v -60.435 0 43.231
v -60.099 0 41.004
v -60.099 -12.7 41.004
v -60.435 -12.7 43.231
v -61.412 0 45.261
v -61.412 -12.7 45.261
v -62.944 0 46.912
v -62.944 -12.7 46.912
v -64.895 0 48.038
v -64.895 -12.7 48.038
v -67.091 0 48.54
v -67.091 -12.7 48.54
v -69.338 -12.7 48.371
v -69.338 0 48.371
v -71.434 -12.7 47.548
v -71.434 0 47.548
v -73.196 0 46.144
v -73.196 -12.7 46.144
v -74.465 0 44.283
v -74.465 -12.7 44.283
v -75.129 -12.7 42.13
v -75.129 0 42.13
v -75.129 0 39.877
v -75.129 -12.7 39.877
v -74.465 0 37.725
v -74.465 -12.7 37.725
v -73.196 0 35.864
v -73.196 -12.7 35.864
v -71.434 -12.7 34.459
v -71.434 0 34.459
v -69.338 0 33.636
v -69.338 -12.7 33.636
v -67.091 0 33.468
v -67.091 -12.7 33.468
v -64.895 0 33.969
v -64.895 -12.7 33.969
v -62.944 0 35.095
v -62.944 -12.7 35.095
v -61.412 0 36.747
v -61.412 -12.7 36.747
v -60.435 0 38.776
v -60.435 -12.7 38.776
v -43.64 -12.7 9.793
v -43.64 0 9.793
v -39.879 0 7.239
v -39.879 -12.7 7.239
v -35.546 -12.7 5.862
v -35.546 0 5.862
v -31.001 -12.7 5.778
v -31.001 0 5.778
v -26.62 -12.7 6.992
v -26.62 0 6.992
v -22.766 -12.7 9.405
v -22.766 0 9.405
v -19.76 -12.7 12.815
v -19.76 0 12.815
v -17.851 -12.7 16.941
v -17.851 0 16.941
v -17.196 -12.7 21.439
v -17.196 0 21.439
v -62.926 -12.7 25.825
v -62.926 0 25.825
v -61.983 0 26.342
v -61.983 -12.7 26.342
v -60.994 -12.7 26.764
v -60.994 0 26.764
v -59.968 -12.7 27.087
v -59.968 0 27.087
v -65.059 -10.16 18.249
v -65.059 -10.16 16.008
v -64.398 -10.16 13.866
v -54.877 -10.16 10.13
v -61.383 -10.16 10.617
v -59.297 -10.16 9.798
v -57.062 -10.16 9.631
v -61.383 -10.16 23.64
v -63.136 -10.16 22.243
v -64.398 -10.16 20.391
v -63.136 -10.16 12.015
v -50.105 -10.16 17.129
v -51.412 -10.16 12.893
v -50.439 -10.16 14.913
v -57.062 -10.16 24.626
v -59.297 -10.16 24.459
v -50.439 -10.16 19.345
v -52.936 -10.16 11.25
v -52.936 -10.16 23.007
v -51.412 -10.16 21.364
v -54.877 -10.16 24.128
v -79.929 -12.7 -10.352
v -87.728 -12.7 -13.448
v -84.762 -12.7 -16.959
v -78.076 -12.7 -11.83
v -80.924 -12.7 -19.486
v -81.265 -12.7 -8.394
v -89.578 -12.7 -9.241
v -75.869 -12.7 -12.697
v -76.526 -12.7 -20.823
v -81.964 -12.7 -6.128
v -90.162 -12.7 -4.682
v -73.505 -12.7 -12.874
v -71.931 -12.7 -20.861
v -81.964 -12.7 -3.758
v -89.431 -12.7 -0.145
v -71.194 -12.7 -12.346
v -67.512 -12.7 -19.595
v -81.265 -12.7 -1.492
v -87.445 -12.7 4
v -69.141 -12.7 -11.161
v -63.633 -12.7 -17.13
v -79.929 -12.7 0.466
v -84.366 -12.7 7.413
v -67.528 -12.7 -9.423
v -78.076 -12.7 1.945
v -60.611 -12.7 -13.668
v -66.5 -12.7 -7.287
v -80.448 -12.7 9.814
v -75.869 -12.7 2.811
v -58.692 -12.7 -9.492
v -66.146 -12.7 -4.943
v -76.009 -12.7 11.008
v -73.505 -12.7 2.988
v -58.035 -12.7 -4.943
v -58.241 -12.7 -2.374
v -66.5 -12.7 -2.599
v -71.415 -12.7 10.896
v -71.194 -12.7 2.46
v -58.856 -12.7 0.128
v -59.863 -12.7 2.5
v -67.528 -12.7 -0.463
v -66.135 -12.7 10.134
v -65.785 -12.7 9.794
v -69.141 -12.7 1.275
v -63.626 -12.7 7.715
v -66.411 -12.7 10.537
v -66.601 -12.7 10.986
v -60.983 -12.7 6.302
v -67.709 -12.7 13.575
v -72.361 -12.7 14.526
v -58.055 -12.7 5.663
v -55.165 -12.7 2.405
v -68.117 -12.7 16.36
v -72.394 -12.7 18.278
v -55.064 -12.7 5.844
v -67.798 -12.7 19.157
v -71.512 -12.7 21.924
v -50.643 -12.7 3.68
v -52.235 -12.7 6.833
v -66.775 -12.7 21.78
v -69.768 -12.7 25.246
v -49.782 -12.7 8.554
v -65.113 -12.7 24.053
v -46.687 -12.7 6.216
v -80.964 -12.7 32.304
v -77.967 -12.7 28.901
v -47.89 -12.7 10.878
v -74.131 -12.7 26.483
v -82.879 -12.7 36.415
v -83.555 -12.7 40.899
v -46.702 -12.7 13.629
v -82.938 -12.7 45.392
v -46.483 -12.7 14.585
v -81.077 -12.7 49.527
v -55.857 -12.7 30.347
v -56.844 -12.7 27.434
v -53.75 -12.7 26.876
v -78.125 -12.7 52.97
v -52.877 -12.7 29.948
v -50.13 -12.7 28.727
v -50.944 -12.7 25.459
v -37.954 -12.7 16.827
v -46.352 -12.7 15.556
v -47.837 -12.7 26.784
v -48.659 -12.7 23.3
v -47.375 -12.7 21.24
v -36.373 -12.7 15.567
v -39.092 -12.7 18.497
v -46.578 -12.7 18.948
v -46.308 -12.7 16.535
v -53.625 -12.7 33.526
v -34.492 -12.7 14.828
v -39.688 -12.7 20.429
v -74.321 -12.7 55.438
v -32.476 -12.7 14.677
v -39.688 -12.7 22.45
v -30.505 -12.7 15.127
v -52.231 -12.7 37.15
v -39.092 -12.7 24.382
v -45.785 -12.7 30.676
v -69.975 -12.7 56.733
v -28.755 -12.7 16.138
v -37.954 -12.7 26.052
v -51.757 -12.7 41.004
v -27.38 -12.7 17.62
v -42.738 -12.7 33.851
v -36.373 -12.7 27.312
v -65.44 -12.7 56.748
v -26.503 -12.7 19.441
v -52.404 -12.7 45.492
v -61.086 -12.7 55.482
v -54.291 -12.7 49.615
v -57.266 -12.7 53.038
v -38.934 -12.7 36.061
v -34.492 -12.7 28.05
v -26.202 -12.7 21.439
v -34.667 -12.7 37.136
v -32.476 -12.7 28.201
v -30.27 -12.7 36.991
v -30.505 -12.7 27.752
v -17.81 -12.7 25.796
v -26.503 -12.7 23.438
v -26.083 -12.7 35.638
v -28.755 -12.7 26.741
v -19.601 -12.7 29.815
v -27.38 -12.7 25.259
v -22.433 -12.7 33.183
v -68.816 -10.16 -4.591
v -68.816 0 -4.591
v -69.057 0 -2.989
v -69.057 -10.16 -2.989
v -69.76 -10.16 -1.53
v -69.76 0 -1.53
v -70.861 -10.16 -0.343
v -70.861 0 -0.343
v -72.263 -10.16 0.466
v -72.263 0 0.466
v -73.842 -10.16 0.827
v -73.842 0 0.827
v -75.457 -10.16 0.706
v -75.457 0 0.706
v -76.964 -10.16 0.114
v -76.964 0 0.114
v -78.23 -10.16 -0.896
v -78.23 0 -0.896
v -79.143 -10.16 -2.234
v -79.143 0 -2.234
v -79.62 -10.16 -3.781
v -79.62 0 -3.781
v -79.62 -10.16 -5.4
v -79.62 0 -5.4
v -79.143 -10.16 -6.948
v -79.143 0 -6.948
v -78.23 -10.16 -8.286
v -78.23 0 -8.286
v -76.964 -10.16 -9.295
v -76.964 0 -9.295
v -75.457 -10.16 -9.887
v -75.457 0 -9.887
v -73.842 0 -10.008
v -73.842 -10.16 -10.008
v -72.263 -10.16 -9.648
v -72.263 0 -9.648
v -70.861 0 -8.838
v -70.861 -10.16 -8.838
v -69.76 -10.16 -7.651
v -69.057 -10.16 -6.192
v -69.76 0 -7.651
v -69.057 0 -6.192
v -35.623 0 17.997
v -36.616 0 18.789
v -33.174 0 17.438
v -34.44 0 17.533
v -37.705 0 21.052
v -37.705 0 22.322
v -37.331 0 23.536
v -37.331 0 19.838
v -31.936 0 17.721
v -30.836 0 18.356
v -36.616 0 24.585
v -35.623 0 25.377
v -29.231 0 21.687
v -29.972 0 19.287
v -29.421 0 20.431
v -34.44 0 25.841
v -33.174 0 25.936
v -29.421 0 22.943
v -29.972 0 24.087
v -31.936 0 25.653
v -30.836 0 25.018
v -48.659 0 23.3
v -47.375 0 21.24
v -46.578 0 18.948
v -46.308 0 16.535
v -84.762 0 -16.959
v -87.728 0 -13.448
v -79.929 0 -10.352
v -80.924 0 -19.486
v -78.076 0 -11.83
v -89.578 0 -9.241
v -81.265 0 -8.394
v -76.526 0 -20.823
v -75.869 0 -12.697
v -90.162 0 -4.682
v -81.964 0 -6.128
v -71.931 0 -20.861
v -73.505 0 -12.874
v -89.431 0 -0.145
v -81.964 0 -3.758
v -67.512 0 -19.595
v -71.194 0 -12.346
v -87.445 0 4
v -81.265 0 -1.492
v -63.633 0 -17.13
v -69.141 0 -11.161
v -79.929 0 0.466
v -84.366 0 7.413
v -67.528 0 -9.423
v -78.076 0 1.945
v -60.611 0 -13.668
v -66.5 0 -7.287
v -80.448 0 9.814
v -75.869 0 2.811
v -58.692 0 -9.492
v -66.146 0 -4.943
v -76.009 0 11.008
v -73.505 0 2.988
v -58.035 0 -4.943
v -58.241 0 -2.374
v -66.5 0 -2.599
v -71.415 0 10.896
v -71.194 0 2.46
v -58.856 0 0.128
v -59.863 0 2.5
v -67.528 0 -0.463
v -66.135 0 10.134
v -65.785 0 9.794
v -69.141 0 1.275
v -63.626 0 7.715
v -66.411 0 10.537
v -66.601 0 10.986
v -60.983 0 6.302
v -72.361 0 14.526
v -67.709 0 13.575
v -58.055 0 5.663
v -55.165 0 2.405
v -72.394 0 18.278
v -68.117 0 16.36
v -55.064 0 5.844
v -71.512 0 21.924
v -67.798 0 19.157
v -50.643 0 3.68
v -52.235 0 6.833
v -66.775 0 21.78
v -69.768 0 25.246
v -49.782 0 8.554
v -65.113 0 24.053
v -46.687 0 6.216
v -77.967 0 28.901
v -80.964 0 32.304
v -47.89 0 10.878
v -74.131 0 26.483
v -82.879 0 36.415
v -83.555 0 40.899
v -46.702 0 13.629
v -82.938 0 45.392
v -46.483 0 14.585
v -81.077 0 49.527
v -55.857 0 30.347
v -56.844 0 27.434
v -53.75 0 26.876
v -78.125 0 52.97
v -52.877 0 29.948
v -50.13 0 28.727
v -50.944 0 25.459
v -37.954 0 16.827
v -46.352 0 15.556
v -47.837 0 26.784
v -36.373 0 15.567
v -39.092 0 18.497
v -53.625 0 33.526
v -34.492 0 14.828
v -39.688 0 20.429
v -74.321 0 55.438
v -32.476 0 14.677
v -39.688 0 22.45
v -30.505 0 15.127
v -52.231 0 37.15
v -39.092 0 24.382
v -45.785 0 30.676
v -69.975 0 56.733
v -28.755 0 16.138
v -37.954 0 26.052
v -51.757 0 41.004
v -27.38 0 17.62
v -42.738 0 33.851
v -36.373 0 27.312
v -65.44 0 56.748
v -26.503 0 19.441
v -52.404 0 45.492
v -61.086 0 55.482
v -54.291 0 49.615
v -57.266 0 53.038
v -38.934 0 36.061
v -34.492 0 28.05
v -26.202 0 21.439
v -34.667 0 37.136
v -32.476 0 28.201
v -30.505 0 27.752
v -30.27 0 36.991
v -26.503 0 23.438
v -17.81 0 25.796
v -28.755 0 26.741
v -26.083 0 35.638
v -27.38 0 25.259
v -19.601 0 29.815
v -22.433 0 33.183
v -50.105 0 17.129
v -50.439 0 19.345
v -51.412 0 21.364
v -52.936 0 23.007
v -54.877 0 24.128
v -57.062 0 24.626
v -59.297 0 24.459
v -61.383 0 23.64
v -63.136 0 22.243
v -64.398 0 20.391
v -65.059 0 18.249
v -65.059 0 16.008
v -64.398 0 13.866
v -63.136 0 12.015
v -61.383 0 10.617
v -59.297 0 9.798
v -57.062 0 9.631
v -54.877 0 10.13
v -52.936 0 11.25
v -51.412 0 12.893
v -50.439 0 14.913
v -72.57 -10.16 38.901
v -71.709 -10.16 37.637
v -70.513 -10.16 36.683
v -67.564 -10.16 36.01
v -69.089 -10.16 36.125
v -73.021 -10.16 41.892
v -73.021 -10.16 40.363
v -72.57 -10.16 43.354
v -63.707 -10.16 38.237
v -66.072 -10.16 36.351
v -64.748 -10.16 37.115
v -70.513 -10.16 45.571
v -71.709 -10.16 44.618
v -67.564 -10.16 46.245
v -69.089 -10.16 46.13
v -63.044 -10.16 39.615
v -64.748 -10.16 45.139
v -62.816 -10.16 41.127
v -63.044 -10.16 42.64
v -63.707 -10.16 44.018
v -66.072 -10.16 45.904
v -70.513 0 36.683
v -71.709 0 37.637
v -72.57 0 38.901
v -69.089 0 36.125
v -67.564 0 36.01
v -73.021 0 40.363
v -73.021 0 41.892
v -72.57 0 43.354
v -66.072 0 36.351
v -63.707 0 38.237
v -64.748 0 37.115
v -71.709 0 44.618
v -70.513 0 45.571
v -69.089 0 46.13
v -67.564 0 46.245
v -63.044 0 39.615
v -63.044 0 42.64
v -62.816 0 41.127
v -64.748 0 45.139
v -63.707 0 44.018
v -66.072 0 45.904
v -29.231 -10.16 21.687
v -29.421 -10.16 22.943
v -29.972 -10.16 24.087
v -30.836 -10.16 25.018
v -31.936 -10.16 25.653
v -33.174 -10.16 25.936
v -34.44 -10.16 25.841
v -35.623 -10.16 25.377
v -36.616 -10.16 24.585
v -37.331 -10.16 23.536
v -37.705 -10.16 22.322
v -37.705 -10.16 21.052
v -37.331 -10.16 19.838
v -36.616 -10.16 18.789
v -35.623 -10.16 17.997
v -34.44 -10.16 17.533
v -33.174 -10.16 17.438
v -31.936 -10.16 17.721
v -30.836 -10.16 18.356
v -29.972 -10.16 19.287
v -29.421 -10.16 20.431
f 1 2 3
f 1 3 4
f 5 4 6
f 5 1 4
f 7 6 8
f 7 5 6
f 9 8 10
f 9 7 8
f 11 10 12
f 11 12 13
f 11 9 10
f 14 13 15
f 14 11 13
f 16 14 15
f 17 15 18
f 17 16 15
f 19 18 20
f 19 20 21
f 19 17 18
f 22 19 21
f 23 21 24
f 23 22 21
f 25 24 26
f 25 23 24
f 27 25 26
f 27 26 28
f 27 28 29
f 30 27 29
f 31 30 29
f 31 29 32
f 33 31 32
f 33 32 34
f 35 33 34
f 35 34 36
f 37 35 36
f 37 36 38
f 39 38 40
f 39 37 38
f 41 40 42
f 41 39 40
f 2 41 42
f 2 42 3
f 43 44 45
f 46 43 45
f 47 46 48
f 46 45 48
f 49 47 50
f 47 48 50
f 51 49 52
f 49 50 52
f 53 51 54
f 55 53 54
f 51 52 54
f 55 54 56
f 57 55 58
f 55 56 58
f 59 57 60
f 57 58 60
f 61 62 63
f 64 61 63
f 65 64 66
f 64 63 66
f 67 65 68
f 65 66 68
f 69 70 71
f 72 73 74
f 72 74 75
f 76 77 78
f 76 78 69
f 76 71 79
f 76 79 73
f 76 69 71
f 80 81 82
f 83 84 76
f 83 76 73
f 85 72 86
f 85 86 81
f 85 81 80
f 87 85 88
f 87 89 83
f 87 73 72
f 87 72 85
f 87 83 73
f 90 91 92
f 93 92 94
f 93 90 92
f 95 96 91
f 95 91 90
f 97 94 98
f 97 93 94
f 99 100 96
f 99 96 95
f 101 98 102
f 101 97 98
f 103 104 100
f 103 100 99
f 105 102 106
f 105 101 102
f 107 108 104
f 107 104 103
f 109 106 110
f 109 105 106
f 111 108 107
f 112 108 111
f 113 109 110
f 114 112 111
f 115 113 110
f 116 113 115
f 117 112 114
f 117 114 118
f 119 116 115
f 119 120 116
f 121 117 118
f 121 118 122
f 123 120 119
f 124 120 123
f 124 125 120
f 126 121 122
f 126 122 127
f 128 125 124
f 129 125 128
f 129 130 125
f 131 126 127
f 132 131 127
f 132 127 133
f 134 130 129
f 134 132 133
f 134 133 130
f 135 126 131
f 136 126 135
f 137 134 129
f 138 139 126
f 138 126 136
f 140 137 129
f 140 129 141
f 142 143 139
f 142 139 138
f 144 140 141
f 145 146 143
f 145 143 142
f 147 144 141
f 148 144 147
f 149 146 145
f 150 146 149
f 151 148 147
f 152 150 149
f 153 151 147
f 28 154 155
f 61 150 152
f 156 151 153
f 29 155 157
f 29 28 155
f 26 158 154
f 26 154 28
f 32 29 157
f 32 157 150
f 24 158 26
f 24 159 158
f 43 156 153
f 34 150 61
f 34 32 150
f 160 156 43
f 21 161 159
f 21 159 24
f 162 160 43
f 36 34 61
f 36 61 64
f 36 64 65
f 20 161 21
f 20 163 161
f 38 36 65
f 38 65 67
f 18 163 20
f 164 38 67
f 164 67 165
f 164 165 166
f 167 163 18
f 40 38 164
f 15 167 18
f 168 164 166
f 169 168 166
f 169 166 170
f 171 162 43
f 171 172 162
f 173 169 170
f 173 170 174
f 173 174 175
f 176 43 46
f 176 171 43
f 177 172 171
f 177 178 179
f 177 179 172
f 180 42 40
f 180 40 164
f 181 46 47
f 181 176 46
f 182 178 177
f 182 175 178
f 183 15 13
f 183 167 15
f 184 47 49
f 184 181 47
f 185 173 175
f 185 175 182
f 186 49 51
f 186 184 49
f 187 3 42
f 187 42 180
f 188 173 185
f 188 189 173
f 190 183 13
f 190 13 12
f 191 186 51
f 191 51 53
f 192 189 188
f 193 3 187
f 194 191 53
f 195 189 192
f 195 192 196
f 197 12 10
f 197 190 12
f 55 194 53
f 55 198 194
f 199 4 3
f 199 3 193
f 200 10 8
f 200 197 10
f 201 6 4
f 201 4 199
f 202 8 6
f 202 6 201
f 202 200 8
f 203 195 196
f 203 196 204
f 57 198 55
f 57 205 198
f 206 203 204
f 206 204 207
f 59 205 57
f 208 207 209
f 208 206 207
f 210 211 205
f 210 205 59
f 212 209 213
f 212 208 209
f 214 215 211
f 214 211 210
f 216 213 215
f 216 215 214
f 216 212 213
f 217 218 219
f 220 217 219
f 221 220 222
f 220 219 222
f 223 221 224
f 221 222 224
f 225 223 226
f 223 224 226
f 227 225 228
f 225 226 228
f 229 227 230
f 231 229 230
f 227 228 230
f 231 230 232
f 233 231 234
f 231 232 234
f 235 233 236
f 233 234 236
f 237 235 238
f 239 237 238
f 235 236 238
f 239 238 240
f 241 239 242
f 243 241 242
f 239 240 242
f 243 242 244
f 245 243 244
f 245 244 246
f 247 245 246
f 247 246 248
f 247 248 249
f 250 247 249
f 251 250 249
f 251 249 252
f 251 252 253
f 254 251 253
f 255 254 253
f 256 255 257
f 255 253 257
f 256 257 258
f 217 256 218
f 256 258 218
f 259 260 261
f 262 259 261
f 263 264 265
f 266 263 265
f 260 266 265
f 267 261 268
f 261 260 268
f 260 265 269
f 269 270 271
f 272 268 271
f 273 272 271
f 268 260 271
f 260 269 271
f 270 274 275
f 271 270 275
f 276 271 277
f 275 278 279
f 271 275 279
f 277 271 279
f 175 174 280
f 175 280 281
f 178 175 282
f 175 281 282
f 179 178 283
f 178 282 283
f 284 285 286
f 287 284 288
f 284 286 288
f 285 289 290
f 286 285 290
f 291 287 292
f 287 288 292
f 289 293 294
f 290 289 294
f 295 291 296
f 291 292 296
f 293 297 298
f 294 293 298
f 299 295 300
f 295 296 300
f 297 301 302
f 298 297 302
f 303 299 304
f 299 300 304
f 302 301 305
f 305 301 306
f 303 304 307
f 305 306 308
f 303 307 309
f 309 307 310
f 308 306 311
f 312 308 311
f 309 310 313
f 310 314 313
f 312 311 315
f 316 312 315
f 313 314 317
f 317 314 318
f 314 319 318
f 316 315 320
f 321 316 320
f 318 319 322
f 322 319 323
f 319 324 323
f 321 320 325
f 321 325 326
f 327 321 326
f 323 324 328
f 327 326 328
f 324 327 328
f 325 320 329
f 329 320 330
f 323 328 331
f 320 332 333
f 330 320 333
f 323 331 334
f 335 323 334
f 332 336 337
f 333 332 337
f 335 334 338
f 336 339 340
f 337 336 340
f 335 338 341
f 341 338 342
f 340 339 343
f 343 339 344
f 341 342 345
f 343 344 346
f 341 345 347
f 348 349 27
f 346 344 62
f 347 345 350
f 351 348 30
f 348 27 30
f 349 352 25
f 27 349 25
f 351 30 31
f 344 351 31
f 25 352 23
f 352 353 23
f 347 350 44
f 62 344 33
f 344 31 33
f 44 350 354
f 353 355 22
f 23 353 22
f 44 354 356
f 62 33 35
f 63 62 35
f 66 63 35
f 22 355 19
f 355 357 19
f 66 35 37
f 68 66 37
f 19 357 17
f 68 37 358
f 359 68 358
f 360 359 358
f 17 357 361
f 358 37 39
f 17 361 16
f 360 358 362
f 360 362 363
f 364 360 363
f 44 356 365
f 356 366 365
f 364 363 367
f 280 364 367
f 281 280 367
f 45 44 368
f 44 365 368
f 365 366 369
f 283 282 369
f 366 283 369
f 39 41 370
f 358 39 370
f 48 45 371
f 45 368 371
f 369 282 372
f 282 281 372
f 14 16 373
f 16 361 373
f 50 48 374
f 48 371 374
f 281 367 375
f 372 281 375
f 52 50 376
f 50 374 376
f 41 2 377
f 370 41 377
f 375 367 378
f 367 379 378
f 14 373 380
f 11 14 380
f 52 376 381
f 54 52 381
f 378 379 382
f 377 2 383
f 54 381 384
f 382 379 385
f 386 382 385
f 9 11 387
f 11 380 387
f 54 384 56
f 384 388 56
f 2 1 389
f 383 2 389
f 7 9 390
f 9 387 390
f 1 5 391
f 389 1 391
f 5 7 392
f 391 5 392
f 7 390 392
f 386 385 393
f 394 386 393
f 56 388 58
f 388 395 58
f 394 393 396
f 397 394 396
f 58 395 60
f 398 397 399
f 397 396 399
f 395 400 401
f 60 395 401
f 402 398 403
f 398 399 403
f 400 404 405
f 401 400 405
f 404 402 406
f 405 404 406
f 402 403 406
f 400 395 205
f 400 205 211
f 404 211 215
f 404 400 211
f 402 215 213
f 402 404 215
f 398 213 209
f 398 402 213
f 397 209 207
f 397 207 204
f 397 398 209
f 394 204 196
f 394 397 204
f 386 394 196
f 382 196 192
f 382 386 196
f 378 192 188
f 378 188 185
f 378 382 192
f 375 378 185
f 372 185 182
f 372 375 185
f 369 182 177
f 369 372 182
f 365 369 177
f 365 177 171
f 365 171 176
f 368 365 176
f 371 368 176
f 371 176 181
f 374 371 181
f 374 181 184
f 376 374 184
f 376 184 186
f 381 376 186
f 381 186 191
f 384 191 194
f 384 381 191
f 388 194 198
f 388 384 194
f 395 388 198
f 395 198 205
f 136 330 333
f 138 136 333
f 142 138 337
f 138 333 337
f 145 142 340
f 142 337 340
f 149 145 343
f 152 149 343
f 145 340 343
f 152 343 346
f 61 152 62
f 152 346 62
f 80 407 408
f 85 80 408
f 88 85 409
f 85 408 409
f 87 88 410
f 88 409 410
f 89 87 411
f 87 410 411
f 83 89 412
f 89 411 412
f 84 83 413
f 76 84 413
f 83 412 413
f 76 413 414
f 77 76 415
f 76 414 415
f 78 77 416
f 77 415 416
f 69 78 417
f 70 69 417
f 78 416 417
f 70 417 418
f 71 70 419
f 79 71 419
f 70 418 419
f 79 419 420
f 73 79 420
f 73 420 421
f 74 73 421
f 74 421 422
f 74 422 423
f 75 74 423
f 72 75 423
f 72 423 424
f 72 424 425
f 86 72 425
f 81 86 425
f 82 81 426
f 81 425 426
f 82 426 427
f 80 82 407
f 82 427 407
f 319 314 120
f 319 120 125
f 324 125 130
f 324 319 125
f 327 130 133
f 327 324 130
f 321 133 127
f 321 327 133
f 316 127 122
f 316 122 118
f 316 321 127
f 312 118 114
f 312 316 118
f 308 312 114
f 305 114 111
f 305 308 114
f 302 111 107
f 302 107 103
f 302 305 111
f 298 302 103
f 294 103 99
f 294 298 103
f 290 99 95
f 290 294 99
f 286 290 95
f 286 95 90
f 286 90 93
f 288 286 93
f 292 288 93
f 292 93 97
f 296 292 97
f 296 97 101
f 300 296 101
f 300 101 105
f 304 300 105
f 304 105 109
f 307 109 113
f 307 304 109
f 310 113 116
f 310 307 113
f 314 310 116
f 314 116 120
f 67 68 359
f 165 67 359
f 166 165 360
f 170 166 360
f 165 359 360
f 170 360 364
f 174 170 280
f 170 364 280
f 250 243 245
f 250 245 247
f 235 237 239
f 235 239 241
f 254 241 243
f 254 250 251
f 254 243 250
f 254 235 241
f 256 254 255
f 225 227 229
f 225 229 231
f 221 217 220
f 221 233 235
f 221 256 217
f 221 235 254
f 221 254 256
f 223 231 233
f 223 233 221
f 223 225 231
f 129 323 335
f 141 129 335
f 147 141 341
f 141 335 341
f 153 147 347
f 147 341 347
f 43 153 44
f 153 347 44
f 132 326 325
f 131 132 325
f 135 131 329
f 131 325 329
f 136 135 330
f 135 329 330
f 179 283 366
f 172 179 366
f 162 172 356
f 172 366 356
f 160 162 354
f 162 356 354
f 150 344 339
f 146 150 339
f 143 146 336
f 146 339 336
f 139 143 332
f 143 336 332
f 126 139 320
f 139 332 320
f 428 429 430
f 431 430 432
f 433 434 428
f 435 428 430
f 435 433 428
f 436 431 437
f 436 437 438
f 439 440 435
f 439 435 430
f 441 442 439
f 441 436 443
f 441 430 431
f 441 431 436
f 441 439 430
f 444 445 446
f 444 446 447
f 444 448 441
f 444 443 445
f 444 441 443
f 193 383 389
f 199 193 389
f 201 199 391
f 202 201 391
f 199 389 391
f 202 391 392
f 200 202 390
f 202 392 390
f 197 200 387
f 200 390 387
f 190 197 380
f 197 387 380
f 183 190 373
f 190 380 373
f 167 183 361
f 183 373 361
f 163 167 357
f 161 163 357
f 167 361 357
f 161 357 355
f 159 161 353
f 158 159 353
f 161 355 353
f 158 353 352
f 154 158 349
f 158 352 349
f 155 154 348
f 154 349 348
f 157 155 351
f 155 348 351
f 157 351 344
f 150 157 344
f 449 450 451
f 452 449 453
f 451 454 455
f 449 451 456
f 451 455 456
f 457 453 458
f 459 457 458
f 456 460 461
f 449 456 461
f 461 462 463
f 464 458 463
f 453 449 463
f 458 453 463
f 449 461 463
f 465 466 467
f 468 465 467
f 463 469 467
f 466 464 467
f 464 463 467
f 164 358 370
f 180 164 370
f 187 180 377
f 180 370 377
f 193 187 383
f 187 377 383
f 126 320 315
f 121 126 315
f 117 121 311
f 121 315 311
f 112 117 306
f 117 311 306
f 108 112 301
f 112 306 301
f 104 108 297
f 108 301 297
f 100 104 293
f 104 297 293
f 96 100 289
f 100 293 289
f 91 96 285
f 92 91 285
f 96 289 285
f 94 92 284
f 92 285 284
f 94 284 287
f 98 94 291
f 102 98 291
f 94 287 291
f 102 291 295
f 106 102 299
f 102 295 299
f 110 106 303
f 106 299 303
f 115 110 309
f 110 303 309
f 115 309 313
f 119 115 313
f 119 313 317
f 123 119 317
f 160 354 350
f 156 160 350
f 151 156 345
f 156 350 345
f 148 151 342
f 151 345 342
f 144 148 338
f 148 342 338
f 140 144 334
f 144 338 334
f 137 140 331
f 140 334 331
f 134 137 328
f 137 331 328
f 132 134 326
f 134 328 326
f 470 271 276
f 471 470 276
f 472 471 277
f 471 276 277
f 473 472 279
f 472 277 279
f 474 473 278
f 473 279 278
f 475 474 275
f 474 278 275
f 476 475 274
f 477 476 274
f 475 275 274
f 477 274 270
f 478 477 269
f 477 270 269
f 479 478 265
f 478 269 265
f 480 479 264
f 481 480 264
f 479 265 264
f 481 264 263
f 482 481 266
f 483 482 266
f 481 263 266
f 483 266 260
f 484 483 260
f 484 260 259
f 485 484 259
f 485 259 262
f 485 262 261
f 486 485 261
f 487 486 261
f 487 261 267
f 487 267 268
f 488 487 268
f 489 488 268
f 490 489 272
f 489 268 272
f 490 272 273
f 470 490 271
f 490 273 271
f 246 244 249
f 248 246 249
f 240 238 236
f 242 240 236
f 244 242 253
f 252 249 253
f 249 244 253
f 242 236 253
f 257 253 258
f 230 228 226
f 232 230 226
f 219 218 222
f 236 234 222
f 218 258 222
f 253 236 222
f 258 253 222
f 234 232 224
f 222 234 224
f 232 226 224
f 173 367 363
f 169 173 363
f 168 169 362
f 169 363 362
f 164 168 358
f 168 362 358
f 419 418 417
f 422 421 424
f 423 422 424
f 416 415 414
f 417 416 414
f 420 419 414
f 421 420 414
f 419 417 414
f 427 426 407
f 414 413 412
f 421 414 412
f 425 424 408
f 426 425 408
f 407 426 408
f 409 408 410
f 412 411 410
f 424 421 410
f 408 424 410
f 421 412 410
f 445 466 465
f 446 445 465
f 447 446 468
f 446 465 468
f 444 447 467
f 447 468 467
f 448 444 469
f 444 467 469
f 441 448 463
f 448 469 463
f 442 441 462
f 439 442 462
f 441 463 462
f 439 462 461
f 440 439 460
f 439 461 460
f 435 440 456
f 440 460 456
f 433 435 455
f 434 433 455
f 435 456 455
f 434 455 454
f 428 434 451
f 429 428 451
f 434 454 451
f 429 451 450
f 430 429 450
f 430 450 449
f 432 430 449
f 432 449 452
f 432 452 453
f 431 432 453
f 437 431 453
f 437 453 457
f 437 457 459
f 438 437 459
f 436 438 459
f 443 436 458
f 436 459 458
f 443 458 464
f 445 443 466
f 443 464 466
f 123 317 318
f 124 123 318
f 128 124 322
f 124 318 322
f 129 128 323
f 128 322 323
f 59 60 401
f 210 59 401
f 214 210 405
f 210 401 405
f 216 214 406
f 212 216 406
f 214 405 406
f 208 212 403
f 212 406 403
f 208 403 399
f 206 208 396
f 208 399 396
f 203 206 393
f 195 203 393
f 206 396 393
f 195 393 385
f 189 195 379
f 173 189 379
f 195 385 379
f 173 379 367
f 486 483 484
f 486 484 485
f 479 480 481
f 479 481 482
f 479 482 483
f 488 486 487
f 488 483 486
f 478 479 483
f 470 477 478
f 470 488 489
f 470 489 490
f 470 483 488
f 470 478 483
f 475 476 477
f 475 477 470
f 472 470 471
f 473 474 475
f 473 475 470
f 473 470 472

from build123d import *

# Parameters (mm, degrees)
F0_R     = 7.557016
F0_R_2   = 7.953032
F0_R_3   = 6.780991
F1_DEPTH = 12.7
F2_R     = 7.518734
F3_DEPTH = 10.16
F2_R_2   = 4.260812
F2_R_3   = 5.131462
F2_R_4   = 5.432559
F4_DEPTH = 10.16


with BuildPart() as f1:
    # F0 (on Front) → F1 (new body)
    with BuildSketch(Plane.XZ):
        with BuildLine():
            ThreePointArc((-55.856584, 30.347463), (-52.817168, 35.29487), (-51.75689, 41.003697))
            ThreePointArc((-51.75689, 41.003697), (-78.124945, 52.969558), (-69.768216, 25.245539))
            ThreePointArc((-69.768216, 25.245539), (-66.315426, 25.161223), (-62.925898, 25.824521))
            ThreePointArc((-62.925898, 25.824521), (-61.493693, 26.565405), (-59.967896, 27.087001))
            ThreePointArc((-59.967896, 27.087001), (-57.776804, 28.546452), (-55.856584, 30.347463))
        make_face()
        with Locations((-67.655981, 41.003697)):
            Circle(F0_R, mode=Mode.SUBTRACT)
        with BuildLine():
            ThreePointArc((-62.925898, 25.824521), (-66.315426, 25.161223), (-69.768216, 25.245539))
            ThreePointArc((-69.768216, 25.245539), (-72.394039, 18.277527), (-71.414901, 10.895833))
            ThreePointArc((-71.414901, 10.895833), (-64.654926, 8.052259), (-59.863201, 2.500452))
            ThreePointArc((-59.863201, 2.500452), (-50.642847, 3.680407), (-43.639516, 9.792735))
            ThreePointArc((-43.639516, 9.792735), (-45.320757, 11.591286), (-46.701911, 13.629365))
            ThreePointArc((-46.701911, 13.629365), (-55.063816, 5.843974), (-65.784552, 9.793604))
            ThreePointArc((-65.784552, 9.793604), (-66.282826, 10.328304), (-66.600836, 10.98637))
            ThreePointArc((-66.600836, 10.98637), (-67.798368, 19.157118), (-62.925898, 25.824521))
        make_face()
        with BuildLine():
            ThreePointArc((-47.836871, 26.78429), (-51.460277, 29.43567), (-55.856584, 30.347463))
            ThreePointArc((-55.856584, 30.347463), (-57.776804, 28.546452), (-59.967896, 27.087001))
            ThreePointArc((-59.967896, 27.087001), (-53.750018, 26.876335), (-48.659188, 23.300048))
            ThreePointArc((-48.659188, 23.300048), (-48.347117, 25.065554), (-47.836871, 26.78429))
        make_face()
        with BuildLine():
            ThreePointArc((-59.863201, 2.500452), (-64.654926, 8.052259), (-71.414901, 10.895833))
            ThreePointArc((-71.414901, 10.895833), (-86.371319, -15.309934), (-58.034726, -4.942962))
            ThreePointArc((-58.034726, -4.942962), (-58.49854, -1.110608), (-59.863201, 2.500452))
        make_face()
        with Locations((-74.099407, -4.942962)):
            Circle(F0_R_2, mode=Mode.SUBTRACT)
        with BuildLine():
            ThreePointArc((-17.196412, 21.439422), (-30.270027, 36.990992), (-47.836871, 26.78429))
            ThreePointArc((-47.836871, 26.78429), (-48.347117, 25.065554), (-48.659188, 23.300048))
            ThreePointArc((-48.659188, 23.300048), (-46.912242, 20.116287), (-46.307575, 16.53543))
            ThreePointArc((-46.307575, 16.53543), (-46.406609, 15.069081), (-46.701911, 13.629365))
            ThreePointArc((-46.701911, 13.629365), (-45.320757, 11.591286), (-43.639516, 9.792735))
            ThreePointArc((-43.639516, 9.792735), (-26.619657, 6.99225), (-17.196412, 21.439422))
        make_face()
        with Locations((-32.982816, 21.439422)):
            Circle(F0_R_3, mode=Mode.SUBTRACT)
    extrude(amount=F1_DEPTH)


with BuildPart() as f3:
    # F2 (on Front) → F3 (new body)
    with BuildSketch(Plane.XZ):
        with Locations((-57.62402, 17.128717)):
            Circle(F2_R)
    extrude(amount=F3_DEPTH)

    # F2 (on Front) → F4 (join)
    with BuildSketch(Plane.XZ):
        with Locations((-57.62402, 17.128717)):
            Circle(F2_R)
        with Locations((-33.492241, 21.687124)):
            Circle(F2_R_2)
        with Locations((-67.94706, 41.127399)):
            Circle(F2_R_3)
        with Locations((-74.248135, -4.590761)):
            Circle(F2_R_4)
    extrude(amount=F4_DEPTH)


solid = Compound([f1.part, f3.part])
